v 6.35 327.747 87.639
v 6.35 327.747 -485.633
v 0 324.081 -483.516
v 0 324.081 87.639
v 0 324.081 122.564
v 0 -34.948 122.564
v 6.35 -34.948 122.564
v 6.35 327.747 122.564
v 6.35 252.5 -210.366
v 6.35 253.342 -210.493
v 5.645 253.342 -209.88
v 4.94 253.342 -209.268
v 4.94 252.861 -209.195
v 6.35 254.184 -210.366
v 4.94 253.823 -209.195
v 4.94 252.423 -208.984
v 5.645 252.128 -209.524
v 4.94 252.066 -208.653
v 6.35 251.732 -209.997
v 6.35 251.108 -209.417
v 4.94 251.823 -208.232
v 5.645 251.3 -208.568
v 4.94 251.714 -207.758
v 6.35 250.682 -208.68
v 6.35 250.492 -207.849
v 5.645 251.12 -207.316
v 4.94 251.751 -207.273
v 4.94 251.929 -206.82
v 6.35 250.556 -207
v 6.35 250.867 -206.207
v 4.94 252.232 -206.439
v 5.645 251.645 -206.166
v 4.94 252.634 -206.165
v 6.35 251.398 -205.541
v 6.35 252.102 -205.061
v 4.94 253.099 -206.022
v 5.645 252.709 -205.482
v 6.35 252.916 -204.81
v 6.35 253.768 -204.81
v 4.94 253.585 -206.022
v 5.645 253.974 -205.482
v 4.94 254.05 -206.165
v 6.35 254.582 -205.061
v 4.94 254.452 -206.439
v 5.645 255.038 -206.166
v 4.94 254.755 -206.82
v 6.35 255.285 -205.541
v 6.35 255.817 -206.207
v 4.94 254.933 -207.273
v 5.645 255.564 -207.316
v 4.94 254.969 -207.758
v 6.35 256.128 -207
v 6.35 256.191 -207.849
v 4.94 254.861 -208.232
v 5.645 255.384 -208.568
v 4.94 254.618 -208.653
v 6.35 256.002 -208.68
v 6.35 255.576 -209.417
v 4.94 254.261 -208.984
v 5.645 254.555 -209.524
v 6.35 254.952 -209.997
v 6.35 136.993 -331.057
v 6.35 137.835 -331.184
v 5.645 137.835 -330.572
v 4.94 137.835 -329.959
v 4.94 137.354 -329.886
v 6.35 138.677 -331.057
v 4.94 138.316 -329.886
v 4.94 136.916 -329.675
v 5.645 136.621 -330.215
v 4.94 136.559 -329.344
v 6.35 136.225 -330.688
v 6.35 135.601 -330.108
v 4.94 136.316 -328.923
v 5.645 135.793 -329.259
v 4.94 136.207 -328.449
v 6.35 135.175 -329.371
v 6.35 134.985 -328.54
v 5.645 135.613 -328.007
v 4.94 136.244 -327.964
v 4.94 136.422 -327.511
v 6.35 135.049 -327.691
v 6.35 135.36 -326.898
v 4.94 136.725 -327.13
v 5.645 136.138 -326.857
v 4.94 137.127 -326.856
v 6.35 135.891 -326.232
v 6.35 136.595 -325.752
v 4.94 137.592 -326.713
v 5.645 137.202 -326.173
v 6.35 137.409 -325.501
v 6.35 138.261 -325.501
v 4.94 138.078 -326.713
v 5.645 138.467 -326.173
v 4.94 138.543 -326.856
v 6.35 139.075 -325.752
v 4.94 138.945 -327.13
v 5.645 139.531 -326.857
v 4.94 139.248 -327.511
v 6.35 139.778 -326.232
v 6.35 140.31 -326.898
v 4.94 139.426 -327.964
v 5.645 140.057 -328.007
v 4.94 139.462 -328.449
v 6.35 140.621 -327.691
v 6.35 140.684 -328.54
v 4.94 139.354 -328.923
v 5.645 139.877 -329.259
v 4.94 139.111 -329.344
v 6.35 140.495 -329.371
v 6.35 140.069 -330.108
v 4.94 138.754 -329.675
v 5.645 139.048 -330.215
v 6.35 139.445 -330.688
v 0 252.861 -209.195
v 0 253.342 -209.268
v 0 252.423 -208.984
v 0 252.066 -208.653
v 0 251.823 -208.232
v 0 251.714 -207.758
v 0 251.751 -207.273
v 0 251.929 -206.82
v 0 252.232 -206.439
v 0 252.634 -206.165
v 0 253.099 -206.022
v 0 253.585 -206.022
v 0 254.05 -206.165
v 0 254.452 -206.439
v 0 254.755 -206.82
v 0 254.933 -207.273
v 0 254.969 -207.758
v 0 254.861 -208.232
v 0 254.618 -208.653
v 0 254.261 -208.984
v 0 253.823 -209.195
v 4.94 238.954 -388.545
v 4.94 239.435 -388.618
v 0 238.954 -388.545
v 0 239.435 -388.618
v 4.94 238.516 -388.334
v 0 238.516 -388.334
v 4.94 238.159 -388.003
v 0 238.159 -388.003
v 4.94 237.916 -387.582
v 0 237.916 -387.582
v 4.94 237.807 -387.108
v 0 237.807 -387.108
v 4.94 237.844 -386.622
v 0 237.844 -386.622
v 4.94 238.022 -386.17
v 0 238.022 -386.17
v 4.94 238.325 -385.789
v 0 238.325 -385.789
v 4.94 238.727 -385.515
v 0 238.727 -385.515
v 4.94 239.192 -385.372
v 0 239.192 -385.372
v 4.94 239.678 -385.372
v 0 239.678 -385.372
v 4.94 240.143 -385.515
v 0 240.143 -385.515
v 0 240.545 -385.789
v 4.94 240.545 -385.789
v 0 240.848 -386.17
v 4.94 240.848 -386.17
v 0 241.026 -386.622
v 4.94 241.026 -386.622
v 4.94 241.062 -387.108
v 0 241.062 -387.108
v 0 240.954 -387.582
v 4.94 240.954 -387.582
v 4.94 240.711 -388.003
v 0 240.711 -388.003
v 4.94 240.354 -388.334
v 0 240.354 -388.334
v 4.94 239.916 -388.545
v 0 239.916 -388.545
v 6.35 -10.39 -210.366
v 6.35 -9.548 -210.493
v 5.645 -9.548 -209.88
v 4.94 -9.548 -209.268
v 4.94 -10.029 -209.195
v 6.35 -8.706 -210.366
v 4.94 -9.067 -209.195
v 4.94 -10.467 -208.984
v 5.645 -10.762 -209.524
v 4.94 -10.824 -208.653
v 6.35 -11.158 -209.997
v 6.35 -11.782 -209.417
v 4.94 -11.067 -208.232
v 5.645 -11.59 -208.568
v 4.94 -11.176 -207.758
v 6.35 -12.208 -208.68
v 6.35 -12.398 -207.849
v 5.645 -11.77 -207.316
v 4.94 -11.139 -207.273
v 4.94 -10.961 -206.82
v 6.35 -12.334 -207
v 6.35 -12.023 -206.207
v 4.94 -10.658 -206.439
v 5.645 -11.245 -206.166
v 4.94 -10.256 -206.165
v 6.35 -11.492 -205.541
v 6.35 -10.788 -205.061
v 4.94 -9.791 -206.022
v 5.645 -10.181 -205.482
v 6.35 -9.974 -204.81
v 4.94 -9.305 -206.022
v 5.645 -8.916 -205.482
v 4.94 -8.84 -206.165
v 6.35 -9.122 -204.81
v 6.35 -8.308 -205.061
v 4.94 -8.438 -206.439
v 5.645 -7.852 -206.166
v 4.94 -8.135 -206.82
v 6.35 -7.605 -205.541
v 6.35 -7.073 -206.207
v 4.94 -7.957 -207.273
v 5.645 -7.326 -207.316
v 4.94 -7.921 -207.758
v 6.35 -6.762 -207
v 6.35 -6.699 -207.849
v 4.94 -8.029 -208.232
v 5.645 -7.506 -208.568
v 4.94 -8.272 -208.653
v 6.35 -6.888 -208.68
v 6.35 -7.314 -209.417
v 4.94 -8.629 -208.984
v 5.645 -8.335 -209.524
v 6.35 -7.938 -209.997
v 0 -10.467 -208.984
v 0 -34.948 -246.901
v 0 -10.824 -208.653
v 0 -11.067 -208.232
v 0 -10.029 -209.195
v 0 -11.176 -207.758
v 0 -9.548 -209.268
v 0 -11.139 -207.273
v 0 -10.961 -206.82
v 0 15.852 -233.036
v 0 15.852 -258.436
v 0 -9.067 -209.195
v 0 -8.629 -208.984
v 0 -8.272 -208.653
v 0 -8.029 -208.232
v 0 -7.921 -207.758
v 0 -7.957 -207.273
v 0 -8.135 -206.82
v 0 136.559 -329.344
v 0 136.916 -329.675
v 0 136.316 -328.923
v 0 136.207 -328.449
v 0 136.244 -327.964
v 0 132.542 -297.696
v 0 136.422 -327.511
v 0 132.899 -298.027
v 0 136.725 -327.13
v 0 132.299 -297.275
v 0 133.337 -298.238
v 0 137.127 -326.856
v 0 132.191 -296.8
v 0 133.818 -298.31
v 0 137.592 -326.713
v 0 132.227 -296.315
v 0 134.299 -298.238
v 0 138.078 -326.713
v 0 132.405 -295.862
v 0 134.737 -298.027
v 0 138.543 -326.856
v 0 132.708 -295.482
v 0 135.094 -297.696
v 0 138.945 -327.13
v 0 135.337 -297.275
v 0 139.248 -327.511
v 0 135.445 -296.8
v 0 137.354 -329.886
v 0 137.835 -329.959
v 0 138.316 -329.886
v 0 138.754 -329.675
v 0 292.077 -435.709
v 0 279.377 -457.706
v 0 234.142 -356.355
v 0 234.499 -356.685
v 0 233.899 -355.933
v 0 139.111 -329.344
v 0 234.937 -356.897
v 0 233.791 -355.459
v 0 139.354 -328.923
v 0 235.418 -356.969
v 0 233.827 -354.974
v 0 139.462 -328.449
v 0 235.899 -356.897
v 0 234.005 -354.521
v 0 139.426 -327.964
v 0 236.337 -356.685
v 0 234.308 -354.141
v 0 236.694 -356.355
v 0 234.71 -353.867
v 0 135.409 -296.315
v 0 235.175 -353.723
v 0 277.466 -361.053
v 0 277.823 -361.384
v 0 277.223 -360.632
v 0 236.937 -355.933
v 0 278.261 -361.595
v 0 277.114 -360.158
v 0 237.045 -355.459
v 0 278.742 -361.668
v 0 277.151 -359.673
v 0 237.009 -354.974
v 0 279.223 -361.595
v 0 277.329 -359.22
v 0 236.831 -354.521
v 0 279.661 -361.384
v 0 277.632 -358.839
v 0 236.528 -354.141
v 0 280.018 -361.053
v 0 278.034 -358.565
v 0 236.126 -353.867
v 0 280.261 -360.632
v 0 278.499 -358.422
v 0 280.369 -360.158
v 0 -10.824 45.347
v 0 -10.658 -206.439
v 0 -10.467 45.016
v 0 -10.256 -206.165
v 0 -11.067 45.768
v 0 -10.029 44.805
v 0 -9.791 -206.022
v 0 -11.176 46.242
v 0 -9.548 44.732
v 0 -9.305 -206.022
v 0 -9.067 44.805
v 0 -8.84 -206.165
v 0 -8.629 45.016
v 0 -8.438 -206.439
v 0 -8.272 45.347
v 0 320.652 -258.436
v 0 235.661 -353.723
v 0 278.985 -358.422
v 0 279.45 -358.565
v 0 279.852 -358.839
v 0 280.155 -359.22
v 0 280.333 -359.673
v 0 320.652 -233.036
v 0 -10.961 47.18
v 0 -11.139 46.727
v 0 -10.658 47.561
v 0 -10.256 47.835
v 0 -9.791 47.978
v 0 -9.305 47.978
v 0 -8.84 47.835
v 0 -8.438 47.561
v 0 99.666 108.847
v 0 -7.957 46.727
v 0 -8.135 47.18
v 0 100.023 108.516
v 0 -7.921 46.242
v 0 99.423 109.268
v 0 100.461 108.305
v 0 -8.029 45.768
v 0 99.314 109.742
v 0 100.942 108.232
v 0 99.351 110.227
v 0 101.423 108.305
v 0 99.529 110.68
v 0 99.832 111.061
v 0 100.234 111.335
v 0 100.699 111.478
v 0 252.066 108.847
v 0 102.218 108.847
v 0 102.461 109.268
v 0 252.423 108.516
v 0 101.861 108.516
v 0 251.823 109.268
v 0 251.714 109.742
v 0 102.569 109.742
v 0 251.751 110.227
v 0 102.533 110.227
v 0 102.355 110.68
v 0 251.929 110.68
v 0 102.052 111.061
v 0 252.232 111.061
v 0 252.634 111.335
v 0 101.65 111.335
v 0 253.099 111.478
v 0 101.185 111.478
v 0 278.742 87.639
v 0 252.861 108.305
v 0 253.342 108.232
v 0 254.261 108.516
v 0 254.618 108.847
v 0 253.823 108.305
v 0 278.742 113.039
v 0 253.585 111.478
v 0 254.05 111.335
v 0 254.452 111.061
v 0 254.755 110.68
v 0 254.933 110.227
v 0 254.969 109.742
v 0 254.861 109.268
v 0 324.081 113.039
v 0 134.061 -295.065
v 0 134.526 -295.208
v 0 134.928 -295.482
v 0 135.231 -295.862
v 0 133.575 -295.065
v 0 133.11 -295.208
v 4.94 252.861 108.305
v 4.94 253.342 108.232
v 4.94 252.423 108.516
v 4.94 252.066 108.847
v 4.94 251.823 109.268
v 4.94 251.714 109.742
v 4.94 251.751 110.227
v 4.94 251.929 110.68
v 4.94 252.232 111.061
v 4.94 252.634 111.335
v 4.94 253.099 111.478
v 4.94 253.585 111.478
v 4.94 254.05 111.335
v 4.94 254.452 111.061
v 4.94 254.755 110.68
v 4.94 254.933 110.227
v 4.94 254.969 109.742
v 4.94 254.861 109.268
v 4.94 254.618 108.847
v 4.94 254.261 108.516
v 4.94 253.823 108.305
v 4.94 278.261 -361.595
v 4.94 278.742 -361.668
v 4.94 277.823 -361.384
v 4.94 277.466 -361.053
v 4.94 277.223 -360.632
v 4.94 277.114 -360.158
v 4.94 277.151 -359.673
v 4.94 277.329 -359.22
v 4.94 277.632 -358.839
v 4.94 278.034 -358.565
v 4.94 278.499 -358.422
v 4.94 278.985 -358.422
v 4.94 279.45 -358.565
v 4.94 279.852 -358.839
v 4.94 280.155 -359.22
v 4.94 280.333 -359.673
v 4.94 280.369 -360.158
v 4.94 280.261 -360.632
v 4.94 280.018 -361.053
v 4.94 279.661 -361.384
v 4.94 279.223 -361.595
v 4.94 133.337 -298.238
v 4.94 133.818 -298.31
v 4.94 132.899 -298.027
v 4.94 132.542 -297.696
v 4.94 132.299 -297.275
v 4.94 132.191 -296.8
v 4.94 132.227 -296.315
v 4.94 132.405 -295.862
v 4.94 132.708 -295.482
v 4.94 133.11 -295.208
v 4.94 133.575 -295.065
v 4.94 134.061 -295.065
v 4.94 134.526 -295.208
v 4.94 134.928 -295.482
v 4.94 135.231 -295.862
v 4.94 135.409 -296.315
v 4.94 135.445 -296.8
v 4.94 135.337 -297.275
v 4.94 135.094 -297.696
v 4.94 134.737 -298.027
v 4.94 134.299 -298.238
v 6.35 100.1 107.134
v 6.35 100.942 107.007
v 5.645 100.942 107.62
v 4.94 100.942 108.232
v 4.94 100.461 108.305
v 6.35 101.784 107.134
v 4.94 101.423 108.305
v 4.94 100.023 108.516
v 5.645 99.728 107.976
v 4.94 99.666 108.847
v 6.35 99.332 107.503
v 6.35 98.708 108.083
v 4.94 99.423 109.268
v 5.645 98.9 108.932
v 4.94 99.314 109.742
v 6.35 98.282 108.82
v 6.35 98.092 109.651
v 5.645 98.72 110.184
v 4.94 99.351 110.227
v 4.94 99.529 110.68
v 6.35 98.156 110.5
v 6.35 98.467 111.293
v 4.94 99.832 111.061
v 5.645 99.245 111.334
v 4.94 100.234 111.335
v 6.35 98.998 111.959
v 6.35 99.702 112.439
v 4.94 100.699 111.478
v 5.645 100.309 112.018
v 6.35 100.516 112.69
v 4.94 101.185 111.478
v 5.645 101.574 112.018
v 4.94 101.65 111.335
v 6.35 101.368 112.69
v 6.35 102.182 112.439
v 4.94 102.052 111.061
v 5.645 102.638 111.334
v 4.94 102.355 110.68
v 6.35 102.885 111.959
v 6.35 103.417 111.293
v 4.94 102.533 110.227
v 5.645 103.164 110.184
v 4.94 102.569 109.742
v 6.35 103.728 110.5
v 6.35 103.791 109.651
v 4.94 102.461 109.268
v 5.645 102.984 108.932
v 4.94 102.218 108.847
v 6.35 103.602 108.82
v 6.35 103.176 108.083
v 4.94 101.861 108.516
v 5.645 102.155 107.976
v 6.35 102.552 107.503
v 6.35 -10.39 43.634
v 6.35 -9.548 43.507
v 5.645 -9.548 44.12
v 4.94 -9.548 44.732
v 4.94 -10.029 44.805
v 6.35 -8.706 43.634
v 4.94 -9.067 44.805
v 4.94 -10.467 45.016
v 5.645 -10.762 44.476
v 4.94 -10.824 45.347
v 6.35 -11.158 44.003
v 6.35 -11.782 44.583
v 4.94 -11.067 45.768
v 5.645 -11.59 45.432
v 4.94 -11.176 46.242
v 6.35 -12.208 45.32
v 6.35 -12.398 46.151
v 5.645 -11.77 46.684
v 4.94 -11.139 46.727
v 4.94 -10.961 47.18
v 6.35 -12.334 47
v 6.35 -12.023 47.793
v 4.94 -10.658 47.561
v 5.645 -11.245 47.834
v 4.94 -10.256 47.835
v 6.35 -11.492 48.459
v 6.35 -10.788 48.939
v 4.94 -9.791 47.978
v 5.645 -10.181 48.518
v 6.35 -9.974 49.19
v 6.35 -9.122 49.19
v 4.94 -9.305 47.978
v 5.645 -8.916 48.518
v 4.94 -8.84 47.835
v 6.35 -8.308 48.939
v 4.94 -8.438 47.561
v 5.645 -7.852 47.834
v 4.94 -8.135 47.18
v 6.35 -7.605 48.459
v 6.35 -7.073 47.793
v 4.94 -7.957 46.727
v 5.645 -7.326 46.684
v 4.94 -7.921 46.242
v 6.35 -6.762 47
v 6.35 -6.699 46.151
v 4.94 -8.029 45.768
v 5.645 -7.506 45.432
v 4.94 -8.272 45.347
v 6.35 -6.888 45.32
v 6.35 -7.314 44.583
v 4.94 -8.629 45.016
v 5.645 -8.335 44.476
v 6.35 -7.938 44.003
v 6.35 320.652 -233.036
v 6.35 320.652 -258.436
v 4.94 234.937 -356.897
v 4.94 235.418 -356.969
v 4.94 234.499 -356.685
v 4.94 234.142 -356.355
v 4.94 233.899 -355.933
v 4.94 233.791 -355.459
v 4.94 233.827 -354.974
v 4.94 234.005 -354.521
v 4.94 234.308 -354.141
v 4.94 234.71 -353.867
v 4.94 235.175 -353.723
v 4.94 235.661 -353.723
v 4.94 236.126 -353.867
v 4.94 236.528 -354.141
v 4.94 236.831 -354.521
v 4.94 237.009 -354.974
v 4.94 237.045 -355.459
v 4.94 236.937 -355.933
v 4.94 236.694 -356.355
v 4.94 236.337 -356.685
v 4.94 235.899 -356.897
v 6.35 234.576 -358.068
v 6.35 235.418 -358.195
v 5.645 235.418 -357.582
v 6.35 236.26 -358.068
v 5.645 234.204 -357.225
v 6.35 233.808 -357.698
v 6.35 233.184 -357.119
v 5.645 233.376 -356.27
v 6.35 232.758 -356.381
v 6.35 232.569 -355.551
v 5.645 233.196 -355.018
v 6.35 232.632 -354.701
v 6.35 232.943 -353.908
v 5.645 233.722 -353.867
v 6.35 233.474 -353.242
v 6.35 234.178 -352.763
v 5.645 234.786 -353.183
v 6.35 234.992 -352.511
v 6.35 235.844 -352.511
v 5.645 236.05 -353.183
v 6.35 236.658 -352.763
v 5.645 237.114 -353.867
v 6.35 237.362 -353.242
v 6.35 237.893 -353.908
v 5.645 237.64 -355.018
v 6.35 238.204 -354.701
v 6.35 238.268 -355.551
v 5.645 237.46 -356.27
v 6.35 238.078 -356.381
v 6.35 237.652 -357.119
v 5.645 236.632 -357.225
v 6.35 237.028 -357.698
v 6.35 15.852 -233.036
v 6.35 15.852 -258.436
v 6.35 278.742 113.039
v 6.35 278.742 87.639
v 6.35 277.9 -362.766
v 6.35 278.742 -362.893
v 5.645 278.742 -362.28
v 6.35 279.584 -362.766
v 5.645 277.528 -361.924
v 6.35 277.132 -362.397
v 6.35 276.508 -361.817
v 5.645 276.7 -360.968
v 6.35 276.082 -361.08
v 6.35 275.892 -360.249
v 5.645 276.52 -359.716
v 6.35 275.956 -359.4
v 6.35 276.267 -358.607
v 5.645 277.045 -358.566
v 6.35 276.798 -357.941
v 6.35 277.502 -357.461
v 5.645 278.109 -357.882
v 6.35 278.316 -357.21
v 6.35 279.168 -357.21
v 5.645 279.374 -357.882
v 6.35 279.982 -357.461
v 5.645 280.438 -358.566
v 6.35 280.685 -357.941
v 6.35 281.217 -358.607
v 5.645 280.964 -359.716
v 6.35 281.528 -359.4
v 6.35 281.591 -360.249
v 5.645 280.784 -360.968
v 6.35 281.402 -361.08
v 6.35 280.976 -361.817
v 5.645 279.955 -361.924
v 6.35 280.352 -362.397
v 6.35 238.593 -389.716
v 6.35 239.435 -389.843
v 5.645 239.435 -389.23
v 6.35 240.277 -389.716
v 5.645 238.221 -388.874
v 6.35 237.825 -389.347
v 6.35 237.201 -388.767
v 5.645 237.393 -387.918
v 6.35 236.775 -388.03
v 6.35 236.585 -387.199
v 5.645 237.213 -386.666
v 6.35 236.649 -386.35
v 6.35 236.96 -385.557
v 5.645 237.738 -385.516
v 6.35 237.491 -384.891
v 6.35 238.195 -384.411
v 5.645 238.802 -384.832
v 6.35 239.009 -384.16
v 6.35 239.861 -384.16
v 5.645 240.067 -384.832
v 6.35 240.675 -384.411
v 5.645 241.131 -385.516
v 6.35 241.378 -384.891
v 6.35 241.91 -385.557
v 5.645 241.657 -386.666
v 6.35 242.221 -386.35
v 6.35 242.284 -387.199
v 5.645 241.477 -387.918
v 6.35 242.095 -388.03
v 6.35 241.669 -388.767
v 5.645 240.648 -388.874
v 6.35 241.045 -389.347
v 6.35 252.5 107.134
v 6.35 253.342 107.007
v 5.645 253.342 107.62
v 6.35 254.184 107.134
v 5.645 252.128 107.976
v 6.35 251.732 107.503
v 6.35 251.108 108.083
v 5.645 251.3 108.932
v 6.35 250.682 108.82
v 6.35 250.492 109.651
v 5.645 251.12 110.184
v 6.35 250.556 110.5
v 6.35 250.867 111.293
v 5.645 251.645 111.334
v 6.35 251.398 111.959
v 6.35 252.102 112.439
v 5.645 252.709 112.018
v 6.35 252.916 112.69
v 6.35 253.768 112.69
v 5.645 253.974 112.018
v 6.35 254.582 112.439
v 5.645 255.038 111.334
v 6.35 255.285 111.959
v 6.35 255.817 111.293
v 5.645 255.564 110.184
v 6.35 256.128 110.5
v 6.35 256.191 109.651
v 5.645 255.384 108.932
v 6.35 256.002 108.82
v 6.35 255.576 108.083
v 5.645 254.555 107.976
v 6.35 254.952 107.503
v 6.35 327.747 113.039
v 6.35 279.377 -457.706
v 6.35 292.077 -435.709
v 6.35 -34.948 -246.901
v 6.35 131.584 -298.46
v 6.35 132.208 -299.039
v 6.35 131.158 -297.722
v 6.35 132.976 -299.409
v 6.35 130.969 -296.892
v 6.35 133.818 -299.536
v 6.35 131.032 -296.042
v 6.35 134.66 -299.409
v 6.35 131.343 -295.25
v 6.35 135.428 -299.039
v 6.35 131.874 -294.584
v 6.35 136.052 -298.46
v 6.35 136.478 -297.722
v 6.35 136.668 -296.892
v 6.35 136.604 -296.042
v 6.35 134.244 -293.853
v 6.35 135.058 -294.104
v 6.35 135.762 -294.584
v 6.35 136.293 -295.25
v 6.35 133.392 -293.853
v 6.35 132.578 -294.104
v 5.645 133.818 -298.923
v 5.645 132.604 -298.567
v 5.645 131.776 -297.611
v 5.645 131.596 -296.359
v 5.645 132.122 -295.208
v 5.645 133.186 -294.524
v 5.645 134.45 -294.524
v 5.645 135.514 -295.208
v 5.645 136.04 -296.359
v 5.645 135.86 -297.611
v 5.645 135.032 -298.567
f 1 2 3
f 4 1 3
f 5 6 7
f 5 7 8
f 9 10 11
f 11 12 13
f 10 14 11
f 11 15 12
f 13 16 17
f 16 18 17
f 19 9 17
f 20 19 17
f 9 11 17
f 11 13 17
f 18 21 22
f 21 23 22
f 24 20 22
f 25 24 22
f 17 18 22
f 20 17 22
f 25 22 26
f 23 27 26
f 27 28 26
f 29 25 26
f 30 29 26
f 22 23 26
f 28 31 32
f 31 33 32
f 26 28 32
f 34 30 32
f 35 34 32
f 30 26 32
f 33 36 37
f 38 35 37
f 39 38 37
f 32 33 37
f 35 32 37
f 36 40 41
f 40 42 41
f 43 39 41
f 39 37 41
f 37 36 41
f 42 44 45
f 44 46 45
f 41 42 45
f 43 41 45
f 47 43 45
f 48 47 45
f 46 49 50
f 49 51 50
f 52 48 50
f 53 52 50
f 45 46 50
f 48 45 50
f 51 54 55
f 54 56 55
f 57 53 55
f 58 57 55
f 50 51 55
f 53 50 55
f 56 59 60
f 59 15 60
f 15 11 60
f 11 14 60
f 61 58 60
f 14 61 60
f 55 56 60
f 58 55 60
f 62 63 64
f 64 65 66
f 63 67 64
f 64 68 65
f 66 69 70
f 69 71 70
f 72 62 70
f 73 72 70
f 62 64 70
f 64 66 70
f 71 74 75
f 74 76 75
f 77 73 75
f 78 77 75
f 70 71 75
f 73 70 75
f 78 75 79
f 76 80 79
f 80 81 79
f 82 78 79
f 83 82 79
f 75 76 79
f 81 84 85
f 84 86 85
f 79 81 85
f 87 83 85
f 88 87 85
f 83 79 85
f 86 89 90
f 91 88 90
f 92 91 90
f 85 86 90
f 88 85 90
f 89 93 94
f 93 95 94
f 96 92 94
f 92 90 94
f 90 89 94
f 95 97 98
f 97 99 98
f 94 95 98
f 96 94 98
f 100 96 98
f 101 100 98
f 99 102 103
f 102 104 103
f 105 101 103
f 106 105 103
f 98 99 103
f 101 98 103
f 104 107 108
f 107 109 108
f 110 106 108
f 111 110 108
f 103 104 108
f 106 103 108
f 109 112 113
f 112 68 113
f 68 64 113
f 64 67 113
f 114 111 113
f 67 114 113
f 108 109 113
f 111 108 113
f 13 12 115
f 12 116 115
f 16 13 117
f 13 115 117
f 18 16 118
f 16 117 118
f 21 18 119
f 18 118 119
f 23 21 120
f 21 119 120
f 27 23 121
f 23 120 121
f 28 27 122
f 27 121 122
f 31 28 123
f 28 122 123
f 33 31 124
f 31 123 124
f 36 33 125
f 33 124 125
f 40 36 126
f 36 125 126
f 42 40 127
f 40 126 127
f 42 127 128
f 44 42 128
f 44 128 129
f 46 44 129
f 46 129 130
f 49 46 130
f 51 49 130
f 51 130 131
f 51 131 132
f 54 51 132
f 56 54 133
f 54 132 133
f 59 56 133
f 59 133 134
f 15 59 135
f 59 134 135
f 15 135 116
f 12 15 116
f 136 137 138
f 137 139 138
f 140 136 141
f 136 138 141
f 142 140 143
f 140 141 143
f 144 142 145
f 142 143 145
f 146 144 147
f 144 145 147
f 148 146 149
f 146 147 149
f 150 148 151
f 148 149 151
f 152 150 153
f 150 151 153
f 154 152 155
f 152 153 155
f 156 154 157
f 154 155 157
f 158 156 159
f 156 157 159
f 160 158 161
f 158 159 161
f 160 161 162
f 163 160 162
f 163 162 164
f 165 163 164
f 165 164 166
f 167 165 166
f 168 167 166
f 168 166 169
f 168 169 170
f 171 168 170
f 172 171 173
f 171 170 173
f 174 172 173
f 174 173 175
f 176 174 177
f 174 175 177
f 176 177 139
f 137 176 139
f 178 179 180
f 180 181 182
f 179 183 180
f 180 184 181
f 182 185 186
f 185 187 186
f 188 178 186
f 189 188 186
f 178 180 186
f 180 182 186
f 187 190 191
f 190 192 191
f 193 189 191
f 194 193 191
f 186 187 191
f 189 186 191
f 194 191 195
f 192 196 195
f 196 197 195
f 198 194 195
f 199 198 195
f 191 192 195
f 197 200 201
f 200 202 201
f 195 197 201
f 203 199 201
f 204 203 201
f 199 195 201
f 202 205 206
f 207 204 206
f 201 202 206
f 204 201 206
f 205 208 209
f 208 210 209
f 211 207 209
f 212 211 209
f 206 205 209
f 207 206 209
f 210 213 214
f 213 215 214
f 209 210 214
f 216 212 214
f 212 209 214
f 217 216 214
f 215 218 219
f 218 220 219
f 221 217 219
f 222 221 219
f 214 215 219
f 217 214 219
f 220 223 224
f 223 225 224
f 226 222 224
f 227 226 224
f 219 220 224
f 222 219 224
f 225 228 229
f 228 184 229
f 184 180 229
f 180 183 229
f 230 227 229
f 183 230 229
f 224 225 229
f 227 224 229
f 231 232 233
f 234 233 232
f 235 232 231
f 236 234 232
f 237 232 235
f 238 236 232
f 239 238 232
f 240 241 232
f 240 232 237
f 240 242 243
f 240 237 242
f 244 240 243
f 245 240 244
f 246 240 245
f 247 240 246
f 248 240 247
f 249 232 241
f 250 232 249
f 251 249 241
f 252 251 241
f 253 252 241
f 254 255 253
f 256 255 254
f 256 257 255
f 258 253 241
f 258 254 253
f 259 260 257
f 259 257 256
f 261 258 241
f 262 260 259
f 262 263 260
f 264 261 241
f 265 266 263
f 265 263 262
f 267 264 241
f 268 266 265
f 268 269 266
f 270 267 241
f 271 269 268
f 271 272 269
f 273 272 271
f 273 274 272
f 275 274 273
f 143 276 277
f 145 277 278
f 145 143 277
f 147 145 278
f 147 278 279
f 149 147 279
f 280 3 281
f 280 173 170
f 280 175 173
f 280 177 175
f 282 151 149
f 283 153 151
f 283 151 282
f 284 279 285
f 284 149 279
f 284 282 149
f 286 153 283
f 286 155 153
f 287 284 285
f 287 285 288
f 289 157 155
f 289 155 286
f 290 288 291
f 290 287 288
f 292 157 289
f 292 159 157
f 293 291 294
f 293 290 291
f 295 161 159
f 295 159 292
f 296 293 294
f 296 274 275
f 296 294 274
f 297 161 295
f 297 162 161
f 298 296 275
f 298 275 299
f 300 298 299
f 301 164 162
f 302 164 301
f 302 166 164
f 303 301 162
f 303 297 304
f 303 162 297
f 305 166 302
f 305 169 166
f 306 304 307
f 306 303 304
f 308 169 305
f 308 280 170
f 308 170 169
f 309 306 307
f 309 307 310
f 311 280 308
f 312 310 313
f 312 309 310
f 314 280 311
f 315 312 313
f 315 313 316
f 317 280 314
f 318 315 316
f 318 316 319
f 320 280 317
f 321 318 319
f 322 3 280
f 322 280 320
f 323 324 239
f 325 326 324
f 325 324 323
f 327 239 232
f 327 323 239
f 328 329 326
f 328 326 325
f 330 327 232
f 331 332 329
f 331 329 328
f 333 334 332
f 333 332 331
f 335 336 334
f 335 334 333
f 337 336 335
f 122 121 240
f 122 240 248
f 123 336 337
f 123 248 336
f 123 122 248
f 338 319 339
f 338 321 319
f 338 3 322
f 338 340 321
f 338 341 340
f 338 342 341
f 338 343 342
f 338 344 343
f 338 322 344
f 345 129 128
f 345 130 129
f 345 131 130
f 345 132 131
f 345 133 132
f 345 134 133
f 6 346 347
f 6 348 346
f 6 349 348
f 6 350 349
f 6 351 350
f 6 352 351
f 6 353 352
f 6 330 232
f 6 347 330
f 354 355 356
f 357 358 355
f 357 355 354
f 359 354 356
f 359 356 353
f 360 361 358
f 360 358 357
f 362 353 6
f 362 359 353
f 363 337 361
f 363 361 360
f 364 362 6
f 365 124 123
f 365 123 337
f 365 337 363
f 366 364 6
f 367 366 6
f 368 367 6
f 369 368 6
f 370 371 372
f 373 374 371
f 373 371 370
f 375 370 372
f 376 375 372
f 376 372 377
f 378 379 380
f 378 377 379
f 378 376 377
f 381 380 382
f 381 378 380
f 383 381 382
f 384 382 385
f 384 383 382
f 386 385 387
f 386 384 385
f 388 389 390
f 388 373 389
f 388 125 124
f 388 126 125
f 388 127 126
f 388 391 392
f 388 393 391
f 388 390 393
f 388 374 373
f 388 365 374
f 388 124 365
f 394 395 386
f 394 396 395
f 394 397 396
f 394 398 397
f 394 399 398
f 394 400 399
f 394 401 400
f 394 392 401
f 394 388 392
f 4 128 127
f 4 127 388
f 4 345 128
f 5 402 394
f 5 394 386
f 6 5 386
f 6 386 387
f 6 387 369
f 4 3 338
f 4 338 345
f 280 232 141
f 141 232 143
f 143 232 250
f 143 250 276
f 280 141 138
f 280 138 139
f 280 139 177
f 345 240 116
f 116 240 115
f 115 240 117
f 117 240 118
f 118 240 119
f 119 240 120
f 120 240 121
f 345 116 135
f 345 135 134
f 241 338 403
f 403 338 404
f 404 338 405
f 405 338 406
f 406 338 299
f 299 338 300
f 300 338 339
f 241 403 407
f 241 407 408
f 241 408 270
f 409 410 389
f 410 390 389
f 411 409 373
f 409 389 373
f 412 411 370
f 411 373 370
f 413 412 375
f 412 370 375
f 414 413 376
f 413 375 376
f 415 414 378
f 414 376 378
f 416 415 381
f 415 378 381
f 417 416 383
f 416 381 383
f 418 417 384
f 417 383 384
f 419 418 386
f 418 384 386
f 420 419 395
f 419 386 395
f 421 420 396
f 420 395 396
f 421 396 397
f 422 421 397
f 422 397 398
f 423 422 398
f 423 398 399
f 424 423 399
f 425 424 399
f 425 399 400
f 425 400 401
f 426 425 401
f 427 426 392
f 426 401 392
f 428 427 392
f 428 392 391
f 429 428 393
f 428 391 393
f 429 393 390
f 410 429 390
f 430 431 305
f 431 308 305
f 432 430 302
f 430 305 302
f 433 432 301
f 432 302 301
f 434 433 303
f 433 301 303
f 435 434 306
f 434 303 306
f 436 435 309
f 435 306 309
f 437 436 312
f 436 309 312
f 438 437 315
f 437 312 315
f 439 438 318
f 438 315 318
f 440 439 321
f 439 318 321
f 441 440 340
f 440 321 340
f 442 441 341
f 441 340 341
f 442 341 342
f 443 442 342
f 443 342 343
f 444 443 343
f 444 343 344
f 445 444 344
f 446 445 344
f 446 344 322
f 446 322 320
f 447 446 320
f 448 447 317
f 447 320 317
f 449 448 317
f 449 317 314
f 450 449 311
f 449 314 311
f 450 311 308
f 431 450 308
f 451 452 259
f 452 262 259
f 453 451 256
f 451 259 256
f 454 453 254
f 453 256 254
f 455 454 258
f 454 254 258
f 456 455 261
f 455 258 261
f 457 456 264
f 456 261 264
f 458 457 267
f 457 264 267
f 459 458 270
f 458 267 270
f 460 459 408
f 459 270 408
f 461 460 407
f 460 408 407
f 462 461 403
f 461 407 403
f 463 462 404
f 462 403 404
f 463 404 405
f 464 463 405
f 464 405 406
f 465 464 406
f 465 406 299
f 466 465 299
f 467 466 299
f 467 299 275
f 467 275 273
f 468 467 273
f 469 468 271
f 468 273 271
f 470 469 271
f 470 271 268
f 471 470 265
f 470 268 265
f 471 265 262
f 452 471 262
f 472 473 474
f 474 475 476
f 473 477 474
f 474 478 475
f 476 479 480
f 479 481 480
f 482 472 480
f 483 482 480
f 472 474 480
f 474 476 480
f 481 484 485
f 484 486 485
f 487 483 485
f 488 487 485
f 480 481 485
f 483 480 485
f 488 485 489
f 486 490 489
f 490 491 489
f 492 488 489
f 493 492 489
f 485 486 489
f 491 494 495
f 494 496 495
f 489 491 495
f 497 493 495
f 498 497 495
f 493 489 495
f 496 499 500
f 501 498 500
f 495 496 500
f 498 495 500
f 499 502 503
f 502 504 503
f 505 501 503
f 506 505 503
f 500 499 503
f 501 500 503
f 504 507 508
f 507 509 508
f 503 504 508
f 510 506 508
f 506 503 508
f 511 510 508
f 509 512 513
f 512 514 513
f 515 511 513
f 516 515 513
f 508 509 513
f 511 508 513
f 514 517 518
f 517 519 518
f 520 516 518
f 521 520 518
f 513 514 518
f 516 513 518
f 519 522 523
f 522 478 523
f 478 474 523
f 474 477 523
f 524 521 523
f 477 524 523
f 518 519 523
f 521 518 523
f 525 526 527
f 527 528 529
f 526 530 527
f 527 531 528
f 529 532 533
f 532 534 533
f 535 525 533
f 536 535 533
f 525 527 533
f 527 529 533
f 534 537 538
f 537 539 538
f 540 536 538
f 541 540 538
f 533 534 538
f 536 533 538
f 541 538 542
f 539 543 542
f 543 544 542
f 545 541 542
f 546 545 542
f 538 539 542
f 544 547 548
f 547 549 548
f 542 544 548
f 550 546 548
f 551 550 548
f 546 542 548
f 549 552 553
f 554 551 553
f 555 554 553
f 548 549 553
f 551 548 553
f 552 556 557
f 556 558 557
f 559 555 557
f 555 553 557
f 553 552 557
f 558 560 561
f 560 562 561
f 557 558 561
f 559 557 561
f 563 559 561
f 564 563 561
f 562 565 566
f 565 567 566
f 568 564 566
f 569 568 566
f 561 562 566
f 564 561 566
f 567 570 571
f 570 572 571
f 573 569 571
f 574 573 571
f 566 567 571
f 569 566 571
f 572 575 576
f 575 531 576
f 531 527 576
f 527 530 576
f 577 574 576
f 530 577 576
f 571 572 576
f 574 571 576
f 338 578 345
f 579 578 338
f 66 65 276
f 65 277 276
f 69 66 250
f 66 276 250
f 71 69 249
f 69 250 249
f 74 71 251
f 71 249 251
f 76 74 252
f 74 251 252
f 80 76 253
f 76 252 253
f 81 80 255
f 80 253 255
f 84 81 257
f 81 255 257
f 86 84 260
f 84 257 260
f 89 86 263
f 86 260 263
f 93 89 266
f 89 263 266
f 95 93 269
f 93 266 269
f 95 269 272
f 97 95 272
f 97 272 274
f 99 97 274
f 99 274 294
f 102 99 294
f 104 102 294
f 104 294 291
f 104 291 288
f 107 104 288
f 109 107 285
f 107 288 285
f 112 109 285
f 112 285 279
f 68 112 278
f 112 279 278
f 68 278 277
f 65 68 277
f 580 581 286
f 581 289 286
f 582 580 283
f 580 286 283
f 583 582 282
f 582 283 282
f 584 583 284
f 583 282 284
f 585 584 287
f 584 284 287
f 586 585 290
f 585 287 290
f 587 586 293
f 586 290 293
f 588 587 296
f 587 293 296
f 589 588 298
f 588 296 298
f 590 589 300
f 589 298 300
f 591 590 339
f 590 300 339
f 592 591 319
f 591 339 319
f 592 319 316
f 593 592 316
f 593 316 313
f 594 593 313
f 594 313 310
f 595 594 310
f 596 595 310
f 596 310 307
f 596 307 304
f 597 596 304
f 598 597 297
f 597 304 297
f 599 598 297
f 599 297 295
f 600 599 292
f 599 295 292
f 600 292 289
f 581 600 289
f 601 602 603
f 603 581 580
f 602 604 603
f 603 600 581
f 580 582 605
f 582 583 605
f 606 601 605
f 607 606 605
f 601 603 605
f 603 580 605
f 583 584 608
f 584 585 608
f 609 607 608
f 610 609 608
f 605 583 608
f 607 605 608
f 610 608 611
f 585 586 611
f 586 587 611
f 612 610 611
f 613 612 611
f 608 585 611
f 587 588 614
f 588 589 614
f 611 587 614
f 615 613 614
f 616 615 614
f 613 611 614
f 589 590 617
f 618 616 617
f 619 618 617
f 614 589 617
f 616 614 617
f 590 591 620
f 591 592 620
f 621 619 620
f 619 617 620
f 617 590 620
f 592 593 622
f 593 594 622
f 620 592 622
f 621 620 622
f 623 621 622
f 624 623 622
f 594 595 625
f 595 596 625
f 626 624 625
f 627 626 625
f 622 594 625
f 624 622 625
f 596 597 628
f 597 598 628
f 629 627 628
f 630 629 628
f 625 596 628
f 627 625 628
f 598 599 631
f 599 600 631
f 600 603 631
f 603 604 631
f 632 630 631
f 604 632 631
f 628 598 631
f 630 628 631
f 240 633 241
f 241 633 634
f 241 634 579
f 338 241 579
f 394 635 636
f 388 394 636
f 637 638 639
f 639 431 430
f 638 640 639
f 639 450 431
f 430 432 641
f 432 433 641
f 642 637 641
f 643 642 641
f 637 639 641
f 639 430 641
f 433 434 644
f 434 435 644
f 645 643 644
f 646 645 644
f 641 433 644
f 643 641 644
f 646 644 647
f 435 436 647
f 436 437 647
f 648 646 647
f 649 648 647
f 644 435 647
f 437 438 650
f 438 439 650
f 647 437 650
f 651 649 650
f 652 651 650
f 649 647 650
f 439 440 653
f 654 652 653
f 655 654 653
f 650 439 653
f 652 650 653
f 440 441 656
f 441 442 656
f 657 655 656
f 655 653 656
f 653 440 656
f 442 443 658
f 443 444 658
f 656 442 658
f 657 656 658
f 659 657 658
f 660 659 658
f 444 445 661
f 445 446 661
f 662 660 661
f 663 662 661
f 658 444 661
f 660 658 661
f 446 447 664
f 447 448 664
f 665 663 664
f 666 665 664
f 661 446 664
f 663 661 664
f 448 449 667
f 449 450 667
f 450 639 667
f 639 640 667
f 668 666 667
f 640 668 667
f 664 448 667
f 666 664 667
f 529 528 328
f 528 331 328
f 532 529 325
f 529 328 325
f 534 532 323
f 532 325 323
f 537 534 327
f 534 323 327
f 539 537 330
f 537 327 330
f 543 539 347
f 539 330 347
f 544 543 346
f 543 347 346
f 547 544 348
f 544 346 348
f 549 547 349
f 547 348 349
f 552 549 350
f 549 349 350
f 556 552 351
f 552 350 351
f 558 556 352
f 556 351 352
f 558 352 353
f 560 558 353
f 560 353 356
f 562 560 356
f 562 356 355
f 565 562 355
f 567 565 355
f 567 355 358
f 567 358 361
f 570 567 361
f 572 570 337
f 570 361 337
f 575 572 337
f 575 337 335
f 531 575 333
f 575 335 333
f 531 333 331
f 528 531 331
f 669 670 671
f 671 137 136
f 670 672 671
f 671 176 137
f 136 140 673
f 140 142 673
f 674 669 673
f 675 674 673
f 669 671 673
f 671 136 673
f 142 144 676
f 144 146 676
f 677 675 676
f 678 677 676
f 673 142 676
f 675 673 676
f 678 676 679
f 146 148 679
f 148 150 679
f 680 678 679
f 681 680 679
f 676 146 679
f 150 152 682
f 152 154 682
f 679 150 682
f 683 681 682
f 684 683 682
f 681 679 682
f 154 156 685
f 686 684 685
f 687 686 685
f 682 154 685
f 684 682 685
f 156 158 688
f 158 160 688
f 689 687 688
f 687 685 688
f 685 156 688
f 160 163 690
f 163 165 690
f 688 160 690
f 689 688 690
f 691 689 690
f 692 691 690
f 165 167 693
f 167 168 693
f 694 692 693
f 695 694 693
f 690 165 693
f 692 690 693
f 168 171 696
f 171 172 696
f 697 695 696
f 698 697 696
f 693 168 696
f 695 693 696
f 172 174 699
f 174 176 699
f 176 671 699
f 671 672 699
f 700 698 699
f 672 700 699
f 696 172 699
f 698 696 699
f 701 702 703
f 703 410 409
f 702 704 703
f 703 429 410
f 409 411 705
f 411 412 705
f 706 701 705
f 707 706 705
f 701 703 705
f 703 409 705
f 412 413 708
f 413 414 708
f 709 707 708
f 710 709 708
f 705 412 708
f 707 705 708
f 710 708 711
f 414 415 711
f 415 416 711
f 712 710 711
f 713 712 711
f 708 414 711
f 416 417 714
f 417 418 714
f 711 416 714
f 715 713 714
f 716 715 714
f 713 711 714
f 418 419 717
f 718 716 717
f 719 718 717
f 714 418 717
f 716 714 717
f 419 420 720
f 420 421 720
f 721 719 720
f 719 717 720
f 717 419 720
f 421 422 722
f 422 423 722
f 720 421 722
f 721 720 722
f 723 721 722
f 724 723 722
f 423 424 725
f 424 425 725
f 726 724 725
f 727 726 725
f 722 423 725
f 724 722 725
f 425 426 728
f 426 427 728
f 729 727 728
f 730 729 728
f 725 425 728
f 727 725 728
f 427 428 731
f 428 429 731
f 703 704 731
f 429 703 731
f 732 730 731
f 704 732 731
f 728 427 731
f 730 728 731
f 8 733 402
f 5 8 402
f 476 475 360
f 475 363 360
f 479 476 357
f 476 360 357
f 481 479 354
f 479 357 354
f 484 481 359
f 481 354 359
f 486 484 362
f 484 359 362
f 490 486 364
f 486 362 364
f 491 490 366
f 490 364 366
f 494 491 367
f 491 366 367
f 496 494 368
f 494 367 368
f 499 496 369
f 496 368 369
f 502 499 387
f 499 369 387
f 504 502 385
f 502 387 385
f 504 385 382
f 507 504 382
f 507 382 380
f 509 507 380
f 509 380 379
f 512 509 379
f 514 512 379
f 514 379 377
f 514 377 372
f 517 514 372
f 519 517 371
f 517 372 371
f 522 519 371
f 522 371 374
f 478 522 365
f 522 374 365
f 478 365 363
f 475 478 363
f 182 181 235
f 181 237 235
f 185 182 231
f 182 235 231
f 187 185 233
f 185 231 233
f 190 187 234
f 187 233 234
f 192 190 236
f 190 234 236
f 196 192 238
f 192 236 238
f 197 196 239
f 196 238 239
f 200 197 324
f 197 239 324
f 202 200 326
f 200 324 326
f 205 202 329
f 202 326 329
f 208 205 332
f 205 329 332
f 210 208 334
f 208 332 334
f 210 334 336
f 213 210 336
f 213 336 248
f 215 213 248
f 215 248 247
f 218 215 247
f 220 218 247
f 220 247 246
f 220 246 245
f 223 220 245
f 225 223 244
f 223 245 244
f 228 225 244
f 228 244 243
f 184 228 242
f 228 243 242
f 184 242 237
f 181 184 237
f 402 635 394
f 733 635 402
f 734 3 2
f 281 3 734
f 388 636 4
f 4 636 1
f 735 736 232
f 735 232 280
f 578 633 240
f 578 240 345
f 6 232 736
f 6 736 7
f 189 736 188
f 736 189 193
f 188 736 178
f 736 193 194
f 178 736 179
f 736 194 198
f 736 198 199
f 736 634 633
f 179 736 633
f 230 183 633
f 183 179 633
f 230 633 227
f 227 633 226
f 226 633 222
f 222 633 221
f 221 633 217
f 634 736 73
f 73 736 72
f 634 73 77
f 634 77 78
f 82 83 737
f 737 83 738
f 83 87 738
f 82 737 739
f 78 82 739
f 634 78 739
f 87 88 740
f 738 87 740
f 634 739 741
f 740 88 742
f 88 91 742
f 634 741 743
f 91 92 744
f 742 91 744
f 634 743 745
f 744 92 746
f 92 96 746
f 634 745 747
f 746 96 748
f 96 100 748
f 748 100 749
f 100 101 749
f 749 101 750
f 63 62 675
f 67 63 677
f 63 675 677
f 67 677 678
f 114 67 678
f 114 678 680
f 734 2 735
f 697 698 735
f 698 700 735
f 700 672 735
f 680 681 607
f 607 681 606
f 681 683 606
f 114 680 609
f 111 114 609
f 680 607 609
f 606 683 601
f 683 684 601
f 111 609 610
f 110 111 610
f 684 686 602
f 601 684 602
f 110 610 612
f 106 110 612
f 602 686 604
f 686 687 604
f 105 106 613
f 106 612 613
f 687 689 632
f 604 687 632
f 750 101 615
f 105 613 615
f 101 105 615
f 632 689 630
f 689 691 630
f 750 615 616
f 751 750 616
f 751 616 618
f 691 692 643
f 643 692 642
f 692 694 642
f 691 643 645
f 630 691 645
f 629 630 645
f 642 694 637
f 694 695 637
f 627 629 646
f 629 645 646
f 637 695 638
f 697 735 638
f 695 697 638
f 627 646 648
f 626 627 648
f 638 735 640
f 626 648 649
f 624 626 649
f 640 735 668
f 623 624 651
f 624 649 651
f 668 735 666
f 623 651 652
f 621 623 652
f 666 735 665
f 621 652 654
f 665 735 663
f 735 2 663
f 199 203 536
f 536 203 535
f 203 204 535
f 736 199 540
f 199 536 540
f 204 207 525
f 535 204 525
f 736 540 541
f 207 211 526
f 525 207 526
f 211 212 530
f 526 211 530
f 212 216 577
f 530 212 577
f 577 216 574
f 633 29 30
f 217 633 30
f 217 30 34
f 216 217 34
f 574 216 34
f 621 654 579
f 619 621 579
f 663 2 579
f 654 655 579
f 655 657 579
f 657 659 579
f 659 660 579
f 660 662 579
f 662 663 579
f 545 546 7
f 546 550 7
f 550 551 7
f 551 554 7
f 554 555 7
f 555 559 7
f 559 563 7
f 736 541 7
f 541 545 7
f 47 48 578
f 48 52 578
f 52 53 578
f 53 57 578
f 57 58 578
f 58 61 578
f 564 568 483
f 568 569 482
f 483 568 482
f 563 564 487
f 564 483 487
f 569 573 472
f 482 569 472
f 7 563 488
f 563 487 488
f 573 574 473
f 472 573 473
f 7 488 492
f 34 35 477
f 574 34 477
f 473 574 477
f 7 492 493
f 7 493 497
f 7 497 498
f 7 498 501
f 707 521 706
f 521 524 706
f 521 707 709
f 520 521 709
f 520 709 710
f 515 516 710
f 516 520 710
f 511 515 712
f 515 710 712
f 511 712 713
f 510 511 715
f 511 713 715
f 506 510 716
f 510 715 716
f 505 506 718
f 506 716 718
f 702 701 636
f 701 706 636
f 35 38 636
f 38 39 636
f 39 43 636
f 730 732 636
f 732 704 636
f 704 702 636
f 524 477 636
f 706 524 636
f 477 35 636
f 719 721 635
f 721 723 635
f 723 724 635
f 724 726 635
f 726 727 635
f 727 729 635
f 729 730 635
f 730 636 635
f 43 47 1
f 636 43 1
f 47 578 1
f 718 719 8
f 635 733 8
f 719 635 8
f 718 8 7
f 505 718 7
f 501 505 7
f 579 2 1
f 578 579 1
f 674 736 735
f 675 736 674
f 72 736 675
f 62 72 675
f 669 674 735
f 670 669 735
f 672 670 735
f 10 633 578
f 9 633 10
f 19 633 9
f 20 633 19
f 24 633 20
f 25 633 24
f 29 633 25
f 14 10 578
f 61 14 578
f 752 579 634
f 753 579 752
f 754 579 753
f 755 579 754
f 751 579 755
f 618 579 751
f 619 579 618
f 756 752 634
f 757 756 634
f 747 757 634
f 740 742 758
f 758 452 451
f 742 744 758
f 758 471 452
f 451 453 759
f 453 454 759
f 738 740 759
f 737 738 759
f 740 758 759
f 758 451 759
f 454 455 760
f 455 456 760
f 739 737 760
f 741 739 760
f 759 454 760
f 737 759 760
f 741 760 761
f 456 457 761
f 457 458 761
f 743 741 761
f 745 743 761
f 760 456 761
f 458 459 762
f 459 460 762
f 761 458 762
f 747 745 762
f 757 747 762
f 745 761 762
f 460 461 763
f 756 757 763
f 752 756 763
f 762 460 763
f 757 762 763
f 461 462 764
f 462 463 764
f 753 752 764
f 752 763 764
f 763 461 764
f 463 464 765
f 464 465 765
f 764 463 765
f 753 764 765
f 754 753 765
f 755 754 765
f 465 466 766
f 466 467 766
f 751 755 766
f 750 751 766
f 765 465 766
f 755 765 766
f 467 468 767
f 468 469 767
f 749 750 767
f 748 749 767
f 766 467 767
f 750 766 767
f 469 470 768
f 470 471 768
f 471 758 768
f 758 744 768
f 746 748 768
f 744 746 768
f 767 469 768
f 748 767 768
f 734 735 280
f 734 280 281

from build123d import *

# Parameters (mm, degrees)
BOSS_EXTRUDE1_DEPTH                            = 6.35
SKETCH2_W                                      = 25.4
SKETCH2_H                                      = 304.8
CUT_EXTRUDE1_DEPTH                             = 589.439392722
CUT_EXTRUDE2_DEPTH                             = 589.439392722
CSK_FOR_4_FLAT_HEAD_MACHINE_SCREW3_D           = 3.2639
CSK_FOR_4_FLAT_HEAD_MACHINE_SCREW3_CSINK_D     = 5.715
CSK_FOR_4_FLAT_HEAD_MACHINE_SCREW3_CSINK_ANGLE = 82
CSK_FOR_4_FLAT_HEAD_MACHINE_SCREW2_D           = 3.2639
CSK_FOR_4_FLAT_HEAD_MACHINE_SCREW2_CSINK_D     = 5.715
CSK_FOR_4_FLAT_HEAD_MACHINE_SCREW2_CSINK_ANGLE = 82
CSK_FOR_4_FLAT_HEAD_MACHINE_SCREW1_D           = 3.2639
CSK_FOR_4_FLAT_HEAD_MACHINE_SCREW1_CSINK_D     = 5.715
CSK_FOR_4_FLAT_HEAD_MACHINE_SCREW1_CSINK_ANGLE = 82
CSK_FOR_4_FLAT_HEAD_MACHINE_SCREW4_D           = 3.2639
CSK_FOR_4_FLAT_HEAD_MACHINE_SCREW4_CSINK_D     = 5.715
CSK_FOR_4_FLAT_HEAD_MACHINE_SCREW4_CSINK_ANGLE = 82
CHAMFER1_SIZE                                  = 10.558581723
CHAMFER1_SIZE_2                                = 6.096
CUT_EXTRUDE3_REACH                             = 587.916
SKETCH7_W                                      = 25.4
SKETCH7_H                                      = 49.005174209


with BuildPart() as part:
    # Sketch1 → Boss-Extrude1 (new body)
    with BuildSketch(Plane(origin=(0, 0, 0), x_dir=(0, 0, -1), z_dir=(1, 0, 0))):
        Polygon((487.035764647, 330.176862244), (276.230747609, -34.948137756), (-122.564235353, -34.948137756), (-122.564235353, 330.176862244), align=None)
    extrude(amount=BOSS_EXTRUDE1_DEPTH)

    # Sketch2 → Cut-Extrude1 (cut, through all)
    with BuildSketch(Plane(origin=(6.35, 0, 0), x_dir=(0, 0, -1), z_dir=(1, 0, 0))):
        with Locations((245.735764647, 168.251862244)):
            Rectangle(SKETCH2_W, SKETCH2_H)
    extrude(amount=-CUT_EXTRUDE1_DEPTH, mode=Mode.SUBTRACT)

    # Sketch3 → Cut-Extrude2 (cut, through all)
    with BuildSketch(Plane(origin=(6.35, 0, 0), x_dir=(0, 0, -1), z_dir=(1, 0, 0))):
        Polygon((457.706370973, 279.376862244), (276.230747609, -34.948137756), (246.901353935, -34.948137756), (435.709325716, 292.076862244), align=None)
    extrude(amount=-CUT_EXTRUDE2_DEPTH, mode=Mode.SUBTRACT)

    # CSK for #4 Flat Head Machine Screw3 (through all)
    with Locations(Plane(origin=(6.35, 253.341862244, 109.864235353), x_dir=(0, 0, 1), z_dir=(1, 0, 0))):
        with Locations((0, 0), (-317.5, 0), (-469.9, -25.4)):
            CounterSinkHole(CSK_FOR_4_FLAT_HEAD_MACHINE_SCREW3_D / 2, CSK_FOR_4_FLAT_HEAD_MACHINE_SCREW3_CSINK_D / 2, counter_sink_angle=CSK_FOR_4_FLAT_HEAD_MACHINE_SCREW3_CSINK_ANGLE)

    # CSK for #4 Flat Head Machine Screw2 (through all)
    with Locations(Plane(origin=(6.35, 100.941862244, 109.864235353), x_dir=(0, 0, 1), z_dir=(1, 0, 0))):
        with Locations((0, 0)):
            CounterSinkHole(CSK_FOR_4_FLAT_HEAD_MACHINE_SCREW2_D / 2, CSK_FOR_4_FLAT_HEAD_MACHINE_SCREW2_CSINK_D / 2, counter_sink_angle=CSK_FOR_4_FLAT_HEAD_MACHINE_SCREW2_CSINK_ANGLE)

    # CSK for #4 Flat Head Machine Screw1 (through all)
    with Locations(Plane(origin=(6.35, -9.548137756, 46.364235353), x_dir=(0, 0, 1), z_dir=(1, 0, 0))):
        with Locations((0, 0), (-254, 0)):
            CounterSinkHole(CSK_FOR_4_FLAT_HEAD_MACHINE_SCREW1_D / 2, CSK_FOR_4_FLAT_HEAD_MACHINE_SCREW1_CSINK_D / 2, counter_sink_angle=CSK_FOR_4_FLAT_HEAD_MACHINE_SCREW1_CSINK_ANGLE)

    # CSK for #4 Flat Head Machine Screw4 (through all)
    with Locations(Plane(origin=(6.35, 235.418036453, -355.337072673), x_dir=(0, 0, 1), z_dir=(1, 0, 0))):
        with Locations((0, 0), (-31.648510504, -4.016828178), (58.65878735, 101.6), (27.010276846, 97.583171822)):
            CounterSinkHole(CSK_FOR_4_FLAT_HEAD_MACHINE_SCREW4_D / 2, CSK_FOR_4_FLAT_HEAD_MACHINE_SCREW4_CSINK_D / 2, counter_sink_angle=CSK_FOR_4_FLAT_HEAD_MACHINE_SCREW4_CSINK_ANGLE)

    # Chamfer1
    # the kernel refuses this chamfer: 10.558581723, 6.096 mm, written as the material it takes off along each edge
    with BuildSketch(Plane(origin=(0, 330.176862244, 149.880191717), x_dir=(0.9998132206222078, 0.01932676561270281, 0), z_dir=(0, 0, -1))) as chamfer1_piece_1:
        Polygon((CHAMFER1_SIZE * 0.999813220617, CHAMFER1_SIZE * 0.0193267656126), (-CHAMFER1_SIZE_2 * 0.0193267656127, CHAMFER1_SIZE_2 * 0.999813220622), (0, 0), align=None)
    extrude(amount=664.231912729, mode=Mode.SUBTRACT)

    # Sketch7 → Cut-Extrude3 (cut, up to next)
    with BuildSketch(Plane(origin=(6.35, 0, 0), x_dir=(0, 0, -1), z_dir=(1, 0, 0)), mode=Mode.PRIVATE) as cut_extrude3_sk1:
        with Locations((-100.339235353, 303.244449348)):
            Rectangle(SKETCH7_W, SKETCH7_H)
    cut_extrude3_tool1 = extrude(cut_extrude3_sk1.sketch, amount=-CUT_EXTRUDE3_REACH, mode=Mode.PRIVATE) & part.part
    add(cut_extrude3_tool1.solids().sort_by_distance((6.35, 303.244449, 100.339235))[0], mode=Mode.SUBTRACT)


solid = part.part
